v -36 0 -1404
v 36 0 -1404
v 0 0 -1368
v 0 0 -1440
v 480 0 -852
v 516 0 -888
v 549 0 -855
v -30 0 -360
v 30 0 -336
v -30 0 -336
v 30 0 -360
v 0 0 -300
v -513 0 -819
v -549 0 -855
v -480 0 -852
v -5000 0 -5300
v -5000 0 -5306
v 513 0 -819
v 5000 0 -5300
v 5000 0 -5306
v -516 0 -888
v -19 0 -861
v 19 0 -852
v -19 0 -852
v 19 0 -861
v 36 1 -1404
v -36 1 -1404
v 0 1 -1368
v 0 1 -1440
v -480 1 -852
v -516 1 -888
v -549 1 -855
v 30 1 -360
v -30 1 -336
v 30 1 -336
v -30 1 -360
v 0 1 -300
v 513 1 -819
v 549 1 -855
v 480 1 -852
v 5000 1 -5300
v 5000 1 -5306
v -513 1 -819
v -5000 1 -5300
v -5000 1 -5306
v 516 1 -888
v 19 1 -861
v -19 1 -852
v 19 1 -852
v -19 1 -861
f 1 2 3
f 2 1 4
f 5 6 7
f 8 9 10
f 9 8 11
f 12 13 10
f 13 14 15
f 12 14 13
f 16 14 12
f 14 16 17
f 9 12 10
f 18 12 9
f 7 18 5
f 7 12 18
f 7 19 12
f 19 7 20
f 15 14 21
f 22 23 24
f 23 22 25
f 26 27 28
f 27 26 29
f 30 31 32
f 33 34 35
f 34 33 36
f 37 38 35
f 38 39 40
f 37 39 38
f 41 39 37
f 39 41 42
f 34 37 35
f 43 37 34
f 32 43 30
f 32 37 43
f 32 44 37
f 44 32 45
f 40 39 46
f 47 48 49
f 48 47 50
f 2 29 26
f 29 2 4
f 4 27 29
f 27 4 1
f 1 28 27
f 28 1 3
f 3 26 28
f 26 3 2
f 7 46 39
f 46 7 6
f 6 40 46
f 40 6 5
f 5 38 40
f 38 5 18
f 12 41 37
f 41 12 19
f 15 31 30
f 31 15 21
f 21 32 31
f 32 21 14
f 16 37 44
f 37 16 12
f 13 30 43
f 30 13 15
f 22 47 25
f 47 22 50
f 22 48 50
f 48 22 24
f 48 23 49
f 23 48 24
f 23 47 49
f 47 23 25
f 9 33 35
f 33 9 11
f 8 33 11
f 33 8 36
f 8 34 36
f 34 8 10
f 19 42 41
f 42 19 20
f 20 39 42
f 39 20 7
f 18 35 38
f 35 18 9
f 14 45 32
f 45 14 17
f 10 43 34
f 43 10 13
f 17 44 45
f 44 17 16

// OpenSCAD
$fs = 120;

$vpt = [0,1080,480];
$vpr = [-34,0,0];
$vpf = 45;

foul_line = 6;
plain_color = [1,1,1,0.8];
out_color = [1,0.75,0.75,0.8];
eat_color = [0.5,0.75,1,0.8];

// home, first, second, third, rubber
color([1,1,1]) scale([1,-1,-1]) rotate([90,0,0]) linear_extrude(1) {
    polygon([[-30,30*2+300],[30,30*2+300],[30,30+300],[0,300],[-30,30+300]]);
    polygon([[552-36*2,852],[552-36,852+36],[552,852],[552-36,852-36]]);
    polygon([[0,1404+36],[36,1404],[0,1404-36],[-36,1404]]);
    polygon([[-552+36*2,852],[-552+36,852+36],[-552,852],[-552+36,852-36]]);
    polygon([[-19,852],[19,852],[19,9+852],[-19,9+852]]);
}

// foul lines
color([1,1,1,0.5]) scale([1,-1,-1]) rotate([90,0,0]) linear_extrude(1) {
    polygon([[0,300],[-5000,300+5000],[-5000,300+5000+foul_line],[0,300+foul_line]]);
    polygon([[0,300],[5000,300+5000],[5000,300+5000+foul_line],[0,300+foul_line]]);
}

scale([0.1,0.1,-0.1]) translate([-23200,0,0]) {
    color(out_color) polyhedron([[9960,0,15590],[10480,0,18740],[9960,1100,15590],[10480,1100,18740]], [[0,1,3,2]]);
    color(out_color) polyhedron([[9960,0,15590],[9960,0,15690],[9960,1100,15590],[9960,1100,15690]], [[0,1,3,2]]);
    color(out_color) polyhedron([[10480,0,18740],[10480,0,18840],[10480,1100,18740],[10480,1100,18840]], [[0,1,3,2]]);
    color(out_color) polyhedron([[9960,0,15690],[10480,0,18840],[9960,1100,15690],[10480,1100,18840]], [[0,1,3,2]]);
    color(out_color) polyhedron([[9960,1100,15590],[9960,1100,15690],[10480,1100,18740],[10480,1100,18840]], [[0,1,3,2]]);
    color(out_color) polyhedron([[10480,0,18740],[12740,0,23280],[10480,1100,18740],[12740,1100,23280]], [[0,1,3,2]]);
    color(out_color) polyhedron([[10480,0,18740],[10480,0,18840],[10480,1100,18740],[10480,1100,18840]], [[0,1,3,2]]);
    color(out_color) polyhedron([[12740,0,23280],[12740,0,23380],[12740,1100,23280],[12740,1100,23380]], [[0,1,3,2]]);
    color(out_color) polyhedron([[10480,0,18840],[12740,0,23380],[10480,1100,18840],[12740,1100,23380]], [[0,1,3,2]]);
    color(out_color) polyhedron([[10480,1100,18740],[10480,1100,18840],[12740,1100,23280],[12740,1100,23380]], [[0,1,3,2]]);
    color(out_color) polyhedron([[12740,0,23280],[16280,0,26750],[12740,1100,23280],[16280,1100,26750]], [[0,1,3,2]]);
    color(out_color) polyhedron([[12740,0,23280],[12740,0,23380],[12740,1100,23280],[12740,1100,23380]], [[0,1,3,2]]);
    color(out_color) polyhedron([[16280,0,26750],[16280,0,26850],[16280,1100,26750],[16280,1100,26850]], [[0,1,3,2]]);
    color(out_color) polyhedron([[12740,0,23380],[16280,0,26850],[12740,1100,23380],[16280,1100,26850]], [[0,1,3,2]]);
    color(out_color) polyhedron([[12740,1100,23280],[12740,1100,23380],[16280,1100,26750],[16280,1100,26850]], [[0,1,3,2]]);
    color(out_color) polyhedron([[16280,0,26750],[20610,0,28690],[16280,1100,26750],[20610,1100,28690]], [[0,1,3,2]]);
    color(out_color) polyhedron([[16280,0,26750],[16280,0,26850],[16280,1100,26750],[16280,1100,26850]], [[0,1,3,2]]);
    color(out_color) polyhedron([[20610,0,28690],[20610,0,28790],[20610,1100,28690],[20610,1100,28790]], [[0,1,3,2]]);
    color(out_color) polyhedron([[16280,0,26850],[20610,0,28790],[16280,1100,26850],[20610,1100,28790]], [[0,1,3,2]]);
    color(out_color) polyhedron([[16280,1100,26750],[16280,1100,26850],[20610,1100,28690],[20610,1100,28790]], [[0,1,3,2]]);
    color(plain_color) polyhedron([[20610,0,28690],[25790,0,28690],[20610,1100,28690],[25790,1100,28690]], [[0,1,3,2]]);
    color(plain_color) polyhedron([[20610,0,28690],[20610,0,28790],[20610,1100,28690],[20610,1150,28790]], [[0,1,3,2]]);
    color(plain_color) polyhedron([[25790,0,28690],[25780,0,28790],[25790,1100,28690],[25780,1150,28790]], [[0,1,3,2]]);
    color(plain_color) polyhedron([[20610,0,28790],[25780,0,28790],[20610,1150,28790],[25780,1150,28790]], [[0,1,3,2]]);
    color(plain_color) polyhedron([[20610,1100,28690],[20610,1150,28790],[25790,1100,28690],[25780,1150,28790]], [[0,1,3,2]]);
    color(out_color) polyhedron([[25790,0,28690],[30120,0,26750],[25790,1100,28690],[30120,1100,26750]], [[0,1,3,2]]);
    color(out_color) polyhedron([[25790,0,28690],[25790,0,28790],[25790,1100,28690],[25790,1100,28790]], [[0,1,3,2]]);
    color(out_color) polyhedron([[30120,0,26750],[30120,0,26850],[30120,1100,26750],[30120,1100,26850]], [[0,1,3,2]]);
    color(out_color) polyhedron([[25790,0,28790],[30120,0,26850],[25790,1100,28790],[30120,1100,26850]], [[0,1,3,2]]);
    color(out_color) polyhedron([[25790,1100,28690],[25790,1100,28790],[30120,1100,26750],[30120,1100,26850]], [[0,1,3,2]]);
    color(out_color) polyhedron([[30120,0,26760],[33660,0,23280],[30120,1100,26760],[33660,1100,23280]], [[0,1,3,2]]);
    color(out_color) polyhedron([[30120,0,26760],[30120,0,26860],[30120,1100,26760],[30120,1100,26860]], [[0,1,3,2]]);
    color(out_color) polyhedron([[33660,0,23280],[33660,0,23380],[33660,1100,23280],[33660,1100,23380]], [[0,1,3,2]]);
    color(out_color) polyhedron([[30120,0,26860],[33660,0,23380],[30120,1100,26860],[33660,1100,23380]], [[0,1,3,2]]);
    color(out_color) polyhedron([[30120,1100,26760],[30120,1100,26860],[33660,1100,23280],[33660,1100,23380]], [[0,1,3,2]]);
    color(out_color) polyhedron([[33660,0,23280],[35920,0,18740],[33660,1100,23280],[35920,1100,18740]], [[0,1,3,2]]);
    color(out_color) polyhedron([[33660,0,23280],[33660,0,23380],[33660,1100,23280],[33660,1100,23380]], [[0,1,3,2]]);
    color(out_color) polyhedron([[35920,0,18740],[35920,0,18840],[35920,1100,18740],[35920,1100,18840]], [[0,1,3,2]]);
    color(out_color) polyhedron([[33660,0,23380],[35920,0,18840],[33660,1100,23380],[35920,1100,18840]], [[0,1,3,2]]);
    color(out_color) polyhedron([[33660,1100,23280],[33660,1100,23380],[35920,1100,18740],[35920,1100,18840]], [[0,1,3,2]]);
    color(out_color) polyhedron([[35920,0,18740],[36440,0,15590],[35920,1100,18740],[36440,1100,15590]], [[0,1,3,2]]);
    color(out_color) polyhedron([[35920,0,18740],[35920,0,18840],[35920,1100,18740],[35920,1100,18840]], [[0,1,3,2]]);
    color(out_color) polyhedron([[36440,0,15590],[36440,0,15690],[36440,1100,15590],[36440,1100,15690]], [[0,1,3,2]]);
    color(out_color) polyhedron([[35920,0,18840],[36440,0,15690],[35920,1100,18840],[36440,1100,15690]], [[0,1,3,2]]);
    color(out_color) polyhedron([[35920,1100,18740],[35920,1100,18840],[36440,1100,15590],[36440,1100,15690]], [[0,1,3,2]]);
    color(out_color) polyhedron([[27760,0,2720],[32540,0,7350],[27760,1400,2720],[32540,1400,7350]], [[0,1,3,2]]);
    color(out_color) polyhedron([[27760,0,2720],[26710,0,3860],[27760,1400,2720],[26710,1100,3860]], [[0,1,3,2]]);
    color(out_color) polyhedron([[32540,0,7350],[31370,0,8570],[32540,1400,7350],[31370,1100,8570]], [[0,1,3,2]]);
    color(out_color) polyhedron([[26710,0,3860],[31370,0,8570],[26710,1100,3860],[31370,1100,8570]], [[0,1,3,2]]);
    color(out_color) polyhedron([[27760,1400,2720],[26710,1100,3860],[32540,1400,7350],[31370,1100,8570]], [[0,1,3,2]]);
    color(out_color) polyhedron([[13860,0,7350],[18640,0,2720],[13860,1400,7350],[18640,1400,2720]], [[0,1,3,2]]);
    color(out_color) polyhedron([[13860,0,7350],[15030,0,8570],[13860,1400,7350],[15030,1100,8570]], [[0,1,3,2]]);
    color(out_color) polyhedron([[18640,0,2720],[19690,0,3860],[18640,1400,2720],[19690,1100,3860]], [[0,1,3,2]]);
    color(out_color) polyhedron([[15030,0,8570],[19690,0,3860],[15030,1100,8570],[19690,1100,3860]], [[0,1,3,2]]);
    color(out_color) polyhedron([[13860,1400,7350],[15030,1100,8570],[18640,1400,2720],[19690,1100,3860]], [[0,1,3,2]]);
    color(out_color) polyhedron([[20610,0,28700],[25790,0,28700],[20610,4400,28700],[25790,4400,28700]], [[0,1,3,2]]);
    color(out_color) polyhedron([[20610,0,28700],[20610,0,28790],[20610,4400,28700],[20610,4400,28790]], [[0,1,3,2]]);
    color(out_color) polyhedron([[25790,0,28700],[25780,0,28790],[25790,4400,28700],[25780,4400,28790]], [[0,1,3,2]]);
    color(out_color) polyhedron([[20610,0,28790],[25780,0,28790],[20610,4400,28790],[25780,4400,28790]], [[0,1,3,2]]);
    color(out_color) polyhedron([[20610,4400,28700],[20610,4400,28790],[25790,4400,28700],[25780,4400,28790]], [[0,1,3,2]]);
    color(out_color) polyhedron([[1236,0,9090],[19600,0,1940],[1236,5,9090],[19600,5,1940]], [[0,1,3,2]]);
    color(out_color) polyhedron([[1236,0,9090],[1236,0,9100],[1236,5,9090],[1236,5,9100]], [[0,1,3,2]]);
    color(out_color) polyhedron([[19600,0,1940],[19600,0,1950],[19600,5,1940],[19600,5,1950]], [[0,1,3,2]]);
    color(out_color) polyhedron([[1236,0,9100],[19600,0,1950],[1236,5,9100],[19600,5,1950]], [[0,1,3,2]]);
    color(out_color) polyhedron([[1236,5,9090],[1236,5,9100],[19600,5,1940],[19600,5,1950]], [[0,1,3,2]]);
    color(out_color) polyhedron([[26800,0,1940],[34040,0,9090],[26800,5,1940],[34040,5,9090]], [[0,1,3,2]]);
    color(out_color) polyhedron([[26800,0,1940],[26800,0,1950],[26800,5,1940],[26800,5,1950]], [[0,1,3,2]]);
    color(out_color) polyhedron([[34040,0,9090],[34040,0,9100],[34040,5,9090],[34040,5,9100]], [[0,1,3,2]]);
    color(out_color) polyhedron([[26800,0,1950],[34040,0,9100],[26800,5,1950],[34040,5,9100]], [[0,1,3,2]]);
    color(out_color) polyhedron([[26800,5,1940],[26800,5,1950],[34040,5,9090],[34040,5,9100]], [[0,1,3,2]]);
    color(out_color) polyhedron([[16280,0,26850],[16290,0,26850],[16280,1100,26850],[16290,1100,26850]], [[0,1,3,2]]);
    color(out_color) polyhedron([[16280,0,26850],[8790,0,42630],[16280,1100,26850],[8790,9000,42630]], [[0,1,3,2]]);
    color(out_color) polyhedron([[16290,0,26850],[8800,0,42630],[16290,1100,26850],[8800,9000,42630]], [[0,1,3,2]]);
    color(out_color) polyhedron([[8790,0,42630],[8800,0,42630],[8790,9000,42630],[8800,9000,42630]], [[0,1,3,2]]);
    color(out_color) polyhedron([[16280,1100,26850],[8790,9000,42630],[16290,1100,26850],[8800,9000,42630]], [[0,1,3,2]]);
    color(out_color) polyhedron([[12740,0,23380],[12750,0,23380],[12740,1100,23380],[12750,1100,23380]], [[0,1,3,2]]);
    color(out_color) polyhedron([[12740,0,23380],[960,0,40120],[12740,1100,23380],[960,8000,40120]], [[0,1,3,2]]);
    color(out_color) polyhedron([[12750,0,23380],[970,0,40120],[12750,1100,23380],[970,8000,40120]], [[0,1,3,2]]);
    color(out_color) polyhedron([[960,0,40120],[970,0,40120],[960,8000,40120],[970,8000,40120]], [[0,1,3,2]]);
    color(out_color) polyhedron([[12740,1100,23380],[960,8000,40120],[12750,1100,23380],[970,8000,40120]], [[0,1,3,2]]);
    color(plain_color) polyhedron([[0,0,0],[0,0,0],[0,0,0],[0,0,0]], [[0,1,3,2]]);
    color(plain_color) polyhedron([[0,0,0],[0,0,0],[0,0,0],[0,0,0]], [[0,1,3,2]]);
    color(plain_color) polyhedron([[0,0,0],[0,0,0],[0,0,0],[0,0,0]], [[0,1,3,2]]);
    color(plain_color) polyhedron([[0,0,0],[0,0,0],[0,0,0],[0,0,0]], [[0,1,3,2]]);
    color(plain_color) polyhedron([[0,0,0],[0,0,0],[0,0,0],[0,0,0]], [[0,1,3,2]]);
    color(plain_color) polyhedron([[0,0,0],[0,0,0],[0,0,0],[0,0,0]], [[0,1,3,2]]);
    color(plain_color) polyhedron([[0,0,0],[0,0,0],[0,0,0],[0,0,0]], [[0,1,3,2]]);
    color(plain_color) polyhedron([[0,0,0],[0,0,0],[0,0,0],[0,0,0]], [[0,1,3,2]]);
    color(plain_color) polyhedron([[0,0,0],[0,0,0],[0,0,0],[0,0,0]], [[0,1,3,2]]);
    color(plain_color) polyhedron([[0,0,0],[0,0,0],[0,0,0],[0,0,0]], [[0,1,3,2]]);
    color(plain_color) polyhedron([[0,0,0],[0,0,0],[0,0,0],[0,0,0]], [[0,1,3,2]]);
    color(plain_color) polyhedron([[0,0,0],[0,0,0],[0,0,0],[0,0,0]], [[0,1,3,2]]);
    color(plain_color) polyhedron([[0,0,0],[0,0,0],[0,0,0],[0,0,0]], [[0,1,3,2]]);
    color(plain_color) polyhedron([[0,0,0],[0,0,0],[0,0,0],[0,0,0]], [[0,1,3,2]]);
    color(plain_color) polyhedron([[0,0,0],[0,0,0],[0,0,0],[0,0,0]], [[0,1,3,2]]);
    color(plain_color) polyhedron([[0,0,0],[0,0,0],[0,0,0],[0,0,0]], [[0,1,3,2]]);
    color(plain_color) polyhedron([[0,0,0],[0,0,0],[0,0,0],[0,0,0]], [[0,1,3,2]]);
    color(plain_color) polyhedron([[0,0,0],[0,0,0],[0,0,0],[0,0,0]], [[0,1,3,2]]);
    color(plain_color) polyhedron([[0,0,0],[0,0,0],[0,0,0],[0,0,0]], [[0,1,3,2]]);
    color(plain_color) polyhedron([[0,0,0],[0,0,0],[0,0,0],[0,0,0]], [[0,1,3,2]]);
    color(plain_color) polyhedron([[0,0,0],[0,0,0],[0,0,0],[0,0,0]], [[0,1,3,2]]);
    color(plain_color) polyhedron([[0,0,0],[0,0,0],[0,0,0],[0,0,0]], [[0,1,3,2]]);
    color(plain_color) polyhedron([[0,0,0],[0,0,0],[0,0,0],[0,0,0]], [[0,1,3,2]]);
    color(plain_color) polyhedron([[0,0,0],[0,0,0],[0,0,0],[0,0,0]], [[0,1,3,2]]);
    color(plain_color) polyhedron([[0,0,0],[0,0,0],[0,0,0],[0,0,0]], [[0,1,3,2]]);
    color(plain_color) polyhedron([[0,0,0],[0,0,0],[0,0,0],[0,0,0]], [[0,1,3,2]]);
    color(plain_color) polyhedron([[0,0,0],[0,0,0],[0,0,0],[0,0,0]], [[0,1,3,2]]);
    color(plain_color) polyhedron([[0,0,0],[0,0,0],[0,0,0],[0,0,0]], [[0,1,3,2]]);
    color(plain_color) polyhedron([[0,0,0],[0,0,0],[0,0,0],[0,0,0]], [[0,1,3,2]]);
    color(plain_color) polyhedron([[0,0,0],[0,0,0],[0,0,0],[0,0,0]], [[0,1,3,2]]);
    color(plain_color) polyhedron([[0,0,0],[0,0,0],[0,0,0],[0,0,0]], [[0,1,3,2]]);
    color(plain_color) polyhedron([[0,0,0],[0,0,0],[0,0,0],[0,0,0]], [[0,1,3,2]]);
    color(plain_color) polyhedron([[0,0,0],[0,0,0],[0,0,0],[0,0,0]], [[0,1,3,2]]);
    color(plain_color) polyhedron([[0,0,0],[0,0,0],[0,0,0],[0,0,0]], [[0,1,3,2]]);
    color(plain_color) polyhedron([[0,0,0],[0,0,0],[0,0,0],[0,0,0]], [[0,1,3,2]]);
    color(plain_color) polyhedron([[0,0,0],[0,0,0],[0,0,0],[0,0,0]], [[0,1,3,2]]);
    color(plain_color) polyhedron([[0,0,0],[0,0,0],[0,0,0],[0,0,0]], [[0,1,3,2]]);
    color(plain_color) polyhedron([[0,0,0],[0,0,0],[0,0,0],[0,0,0]], [[0,1,3,2]]);
    color(plain_color) polyhedron([[0,0,0],[0,0,0],[0,0,0],[0,0,0]], [[0,1,3,2]]);
    color(plain_color) polyhedron([[0,0,0],[0,0,0],[0,0,0],[0,0,0]], [[0,1,3,2]]);
    color(plain_color) polyhedron([[0,0,0],[0,0,0],[0,0,0],[0,0,0]], [[0,1,3,2]]);
    color(plain_color) polyhedron([[0,0,0],[0,0,0],[0,0,0],[0,0,0]], [[0,1,3,2]]);
    color(plain_color) polyhedron([[0,0,0],[0,0,0],[0,0,0],[0,0,0]], [[0,1,3,2]]);
    color(plain_color) polyhedron([[0,0,0],[0,0,0],[0,0,0],[0,0,0]], [[0,1,3,2]]);
    color(plain_color) polyhedron([[0,0,0],[0,0,0],[0,0,0],[0,0,0]], [[0,1,3,2]]);
    color(plain_color) polyhedron([[0,0,0],[0,0,0],[0,0,0],[0,0,0]], [[0,1,3,2]]);
    color(plain_color) polyhedron([[0,0,0],[0,0,0],[0,0,0],[0,0,0]], [[0,1,3,2]]);
    color(plain_color) polyhedron([[0,0,0],[0,0,0],[0,0,0],[0,0,0]], [[0,1,3,2]]);
    color(plain_color) polyhedron([[0,0,0],[0,0,0],[0,0,0],[0,0,0]], [[0,1,3,2]]);
    color(plain_color) polyhedron([[0,0,0],[0,0,0],[0,0,0],[0,0,0]], [[0,1,3,2]]);
    color(plain_color) polyhedron([[0,0,0],[0,0,0],[0,0,0],[0,0,0]], [[0,1,3,2]]);
    color(plain_color) polyhedron([[0,0,0],[0,0,0],[0,0,0],[0,0,0]], [[0,1,3,2]]);
    color(plain_color) polyhedron([[0,0,0],[0,0,0],[0,0,0],[0,0,0]], [[0,1,3,2]]);
    color(plain_color) polyhedron([[0,0,0],[0,0,0],[0,0,0],[0,0,0]], [[0,1,3,2]]);
    color(plain_color) polyhedron([[0,0,0],[0,0,0],[0,0,0],[0,0,0]], [[0,1,3,2]]);
    color(plain_color) polyhedron([[0,0,0],[0,0,0],[0,0,0],[0,0,0]], [[0,1,3,2]]);
    color(plain_color) polyhedron([[0,0,0],[0,0,0],[0,0,0],[0,0,0]], [[0,1,3,2]]);
    color(plain_color) polyhedron([[0,0,0],[0,0,0],[0,0,0],[0,0,0]], [[0,1,3,2]]);
    color(plain_color) polyhedron([[0,0,0],[0,0,0],[0,0,0],[0,0,0]], [[0,1,3,2]]);
    color(plain_color) polyhedron([[0,0,0],[0,0,0],[0,0,0],[0,0,0]], [[0,1,3,2]]);
    color(plain_color) polyhedron([[0,0,0],[0,0,0],[0,0,0],[0,0,0]], [[0,1,3,2]]);
    color(plain_color) polyhedron([[0,0,0],[0,0,0],[0,0,0],[0,0,0]], [[0,1,3,2]]);
    color(plain_color) polyhedron([[0,0,0],[0,0,0],[0,0,0],[0,0,0]], [[0,1,3,2]]);
    color(plain_color) polyhedron([[0,0,0],[0,0,0],[0,0,0],[0,0,0]], [[0,1,3,2]]);
    color(plain_color) polyhedron([[0,0,0],[0,0,0],[0,0,0],[0,0,0]], [[0,1,3,2]]);
    color(plain_color) polyhedron([[0,0,0],[0,0,0],[0,0,0],[0,0,0]], [[0,1,3,2]]);
    color(plain_color) polyhedron([[0,0,0],[0,0,0],[0,0,0],[0,0,0]], [[0,1,3,2]]);
    color(plain_color) polyhedron([[0,0,0],[0,0,0],[0,0,0],[0,0,0]], [[0,1,3,2]]);
    color(plain_color) polyhedron([[0,0,0],[0,0,0],[0,0,0],[0,0,0]], [[0,1,3,2]]);
    color(plain_color) polyhedron([[0,0,0],[0,0,0],[0,0,0],[0,0,0]], [[0,1,3,2]]);
    color(plain_color) polyhedron([[0,0,0],[0,0,0],[0,0,0],[0,0,0]], [[0,1,3,2]]);
    color(plain_color) polyhedron([[0,0,0],[0,0,0],[0,0,0],[0,0,0]], [[0,1,3,2]]);
    color(plain_color) polyhedron([[0,0,0],[0,0,0],[0,0,0],[0,0,0]], [[0,1,3,2]]);
    color(plain_color) polyhedron([[0,0,0],[0,0,0],[0,0,0],[0,0,0]], [[0,1,3,2]]);
    color(plain_color) polyhedron([[0,0,0],[0,0,0],[0,0,0],[0,0,0]], [[0,1,3,2]]);
    color(plain_color) polyhedron([[0,0,0],[0,0,0],[0,0,0],[0,0,0]], [[0,1,3,2]]);
    color(plain_color) polyhedron([[0,0,0],[0,0,0],[0,0,0],[0,0,0]], [[0,1,3,2]]);
    color(plain_color) polyhedron([[0,0,0],[0,0,0],[0,0,0],[0,0,0]], [[0,1,3,2]]);
    color(plain_color) polyhedron([[0,0,0],[0,0,0],[0,0,0],[0,0,0]], [[0,1,3,2]]);
    color(plain_color) polyhedron([[0,0,0],[0,0,0],[0,0,0],[0,0,0]], [[0,1,3,2]]);
    color(plain_color) polyhedron([[0,0,0],[0,0,0],[0,0,0],[0,0,0]], [[0,1,3,2]]);
    color(plain_color) polyhedron([[0,0,0],[0,0,0],[0,0,0],[0,0,0]], [[0,1,3,2]]);
    color(plain_color) polyhedron([[0,0,0],[0,0,0],[0,0,0],[0,0,0]], [[0,1,3,2]]);
    color(plain_color) polyhedron([[0,0,0],[0,0,0],[0,0,0],[0,0,0]], [[0,1,3,2]]);
    color(plain_color) polyhedron([[0,0,0],[0,0,0],[0,0,0],[0,0,0]], [[0,1,3,2]]);
    color(plain_color) polyhedron([[0,0,0],[0,0,0],[0,0,0],[0,0,0]], [[0,1,3,2]]);
    color(plain_color) polyhedron([[0,0,0],[0,0,0],[0,0,0],[0,0,0]], [[0,1,3,2]]);
    color(plain_color) polyhedron([[0,0,0],[0,0,0],[0,0,0],[0,0,0]], [[0,1,3,2]]);
    color(plain_color) polyhedron([[0,0,0],[0,0,0],[0,0,0],[0,0,0]], [[0,1,3,2]]);
    color(plain_color) polyhedron([[0,0,0],[0,0,0],[0,0,0],[0,0,0]], [[0,1,3,2]]);
    color(plain_color) polyhedron([[0,0,0],[0,0,0],[0,0,0],[0,0,0]], [[0,1,3,2]]);
    color(plain_color) polyhedron([[0,0,0],[0,0,0],[0,0,0],[0,0,0]], [[0,1,3,2]]);
    color(plain_color) polyhedron([[0,0,0],[0,0,0],[0,0,0],[0,0,0]], [[0,1,3,2]]);
    color(plain_color) polyhedron([[0,0,0],[0,0,0],[0,0,0],[0,0,0]], [[0,1,3,2]]);
    color(plain_color) polyhedron([[0,0,0],[0,0,0],[0,0,0],[0,0,0]], [[0,1,3,2]]);
    color(plain_color) polyhedron([[0,0,0],[0,0,0],[0,0,0],[0,0,0]], [[0,1,3,2]]);
    color(plain_color) polyhedron([[0,0,0],[0,0,0],[0,0,0],[0,0,0]], [[0,1,3,2]]);
    color(plain_color) polyhedron([[0,0,0],[0,0,0],[0,0,0],[0,0,0]], [[0,1,3,2]]);
    color(plain_color) polyhedron([[0,0,0],[0,0,0],[0,0,0],[0,0,0]], [[0,1,3,2]]);
    color(plain_color) polyhedron([[0,0,0],[0,0,0],[0,0,0],[0,0,0]], [[0,1,3,2]]);
    color(plain_color) polyhedron([[0,0,0],[0,0,0],[0,0,0],[0,0,0]], [[0,1,3,2]]);
    color(plain_color) polyhedron([[0,0,0],[0,0,0],[0,0,0],[0,0,0]], [[0,1,3,2]]);
    color(plain_color) polyhedron([[0,0,0],[0,0,0],[0,0,0],[0,0,0]], [[0,1,3,2]]);
    color(plain_color) polyhedron([[0,0,0],[0,0,0],[0,0,0],[0,0,0]], [[0,1,3,2]]);
    color(plain_color) polyhedron([[0,0,0],[0,0,0],[0,0,0],[0,0,0]], [[0,1,3,2]]);
    color(plain_color) polyhedron([[0,0,0],[0,0,0],[0,0,0],[0,0,0]], [[0,1,3,2]]);
    color(plain_color) polyhedron([[0,0,0],[0,0,0],[0,0,0],[0,0,0]], [[0,1,3,2]]);
    color(plain_color) polyhedron([[0,0,0],[0,0,0],[0,0,0],[0,0,0]], [[0,1,3,2]]);
    color(plain_color) polyhedron([[0,0,0],[0,0,0],[0,0,0],[0,0,0]], [[0,1,3,2]]);
    color(plain_color) polyhedron([[0,0,0],[0,0,0],[0,0,0],[0,0,0]], [[0,1,3,2]]);
    color(plain_color) polyhedron([[0,0,0],[0,0,0],[0,0,0],[0,0,0]], [[0,1,3,2]]);
    color(plain_color) polyhedron([[0,0,0],[0,0,0],[0,0,0],[0,0,0]], [[0,1,3,2]]);
    color(plain_color) polyhedron([[0,0,0],[0,0,0],[0,0,0],[0,0,0]], [[0,1,3,2]]);
    color(plain_color) polyhedron([[0,0,0],[0,0,0],[0,0,0],[0,0,0]], [[0,1,3,2]]);
    color(plain_color) polyhedron([[0,0,0],[0,0,0],[0,0,0],[0,0,0]], [[0,1,3,2]]);
    color(plain_color) polyhedron([[0,0,0],[0,0,0],[0,0,0],[0,0,0]], [[0,1,3,2]]);
    color(plain_color) polyhedron([[0,0,0],[0,0,0],[0,0,0],[0,0,0]], [[0,1,3,2]]);
    color(plain_color) polyhedron([[0,0,0],[0,0,0],[0,0,0],[0,0,0]], [[0,1,3,2]]);
    color(plain_color) polyhedron([[0,0,0],[0,0,0],[0,0,0],[0,0,0]], [[0,1,3,2]]);
    color(plain_color) polyhedron([[0,0,0],[0,0,0],[0,0,0],[0,0,0]], [[0,1,3,2]]);
    color(plain_color) polyhedron([[0,0,0],[0,0,0],[0,0,0],[0,0,0]], [[0,1,3,2]]);
    color(plain_color) polyhedron([[0,0,0],[0,0,0],[0,0,0],[0,0,0]], [[0,1,3,2]]);
    color(plain_color) polyhedron([[0,0,0],[0,0,0],[0,0,0],[0,0,0]], [[0,1,3,2]]);
    color(plain_color) polyhedron([[0,0,0],[0,0,0],[0,0,0],[0,0,0]], [[0,1,3,2]]);
    color(plain_color) polyhedron([[0,0,0],[0,0,0],[0,0,0],[0,0,0]], [[0,1,3,2]]);
    color(plain_color) polyhedron([[0,0,0],[0,0,0],[0,0,0],[0,0,0]], [[0,1,3,2]]);
    color(plain_color) polyhedron([[0,0,0],[0,0,0],[0,0,0],[0,0,0]], [[0,1,3,2]]);
    color(plain_color) polyhedron([[0,0,0],[0,0,0],[0,0,0],[0,0,0]], [[0,1,3,2]]);
    color(plain_color) polyhedron([[0,0,0],[0,0,0],[0,0,0],[0,0,0]], [[0,1,3,2]]);
    color(plain_color) polyhedron([[0,0,0],[0,0,0],[0,0,0],[0,0,0]], [[0,1,3,2]]);
    color(plain_color) polyhedron([[0,0,0],[0,0,0],[0,0,0],[0,0,0]], [[0,1,3,2]]);
    color(plain_color) polyhedron([[0,0,0],[0,0,0],[0,0,0],[0,0,0]], [[0,1,3,2]]);
    color(plain_color) polyhedron([[0,0,0],[0,0,0],[0,0,0],[0,0,0]], [[0,1,3,2]]);
    color(plain_color) polyhedron([[0,0,0],[0,0,0],[0,0,0],[0,0,0]], [[0,1,3,2]]);
    color(plain_color) polyhedron([[0,0,0],[0,0,0],[0,0,0],[0,0,0]], [[0,1,3,2]]);
    color(plain_color) polyhedron([[0,0,0],[0,0,0],[0,0,0],[0,0,0]], [[0,1,3,2]]);
    color(plain_color) polyhedron([[0,0,0],[0,0,0],[0,0,0],[0,0,0]], [[0,1,3,2]]);
    color(plain_color) polyhedron([[0,0,0],[0,0,0],[0,0,0],[0,0,0]], [[0,1,3,2]]);
    color(plain_color) polyhedron([[0,0,0],[0,0,0],[0,0,0],[0,0,0]], [[0,1,3,2]]);
    color(plain_color) polyhedron([[0,0,0],[0,0,0],[0,0,0],[0,0,0]], [[0,1,3,2]]);
    color(plain_color) polyhedron([[0,0,0],[0,0,0],[0,0,0],[0,0,0]], [[0,1,3,2]]);
    color(plain_color) polyhedron([[0,0,0],[0,0,0],[0,0,0],[0,0,0]], [[0,1,3,2]]);
    color(plain_color) polyhedron([[0,0,0],[0,0,0],[0,0,0],[0,0,0]], [[0,1,3,2]]);
    color(plain_color) polyhedron([[0,0,0],[0,0,0],[0,0,0],[0,0,0]], [[0,1,3,2]]);
    color(plain_color) polyhedron([[0,0,0],[0,0,0],[0,0,0],[0,0,0]], [[0,1,3,2]]);
    color(plain_color) polyhedron([[0,0,0],[0,0,0],[0,0,0],[0,0,0]], [[0,1,3,2]]);
    color(plain_color) polyhedron([[0,0,0],[0,0,0],[0,0,0],[0,0,0]], [[0,1,3,2]]);
    color(plain_color) polyhedron([[0,0,0],[0,0,0],[0,0,0],[0,0,0]], [[0,1,3,2]]);
    color(plain_color) polyhedron([[0,0,0],[0,0,0],[0,0,0],[0,0,0]], [[0,1,3,2]]);
    color(plain_color) polyhedron([[0,0,0],[0,0,0],[0,0,0],[0,0,0]], [[0,1,3,2]]);
    color(plain_color) polyhedron([[0,0,0],[0,0,0],[0,0,0],[0,0,0]], [[0,1,3,2]]);
    color(plain_color) polyhedron([[0,0,0],[0,0,0],[0,0,0],[0,0,0]], [[0,1,3,2]]);
    color(plain_color) polyhedron([[0,0,0],[0,0,0],[0,0,0],[0,0,0]], [[0,1,3,2]]);
    color(plain_color) polyhedron([[0,0,0],[0,0,0],[0,0,0],[0,0,0]], [[0,1,3,2]]);
    color(plain_color) polyhedron([[0,0,0],[0,0,0],[0,0,0],[0,0,0]], [[0,1,3,2]]);
    color(plain_color) polyhedron([[0,0,0],[0,0,0],[0,0,0],[0,0,0]], [[0,1,3,2]]);
    color(plain_color) polyhedron([[0,0,0],[0,0,0],[0,0,0],[0,0,0]], [[0,1,3,2]]);
    color(plain_color) polyhedron([[0,0,0],[0,0,0],[0,0,0],[0,0,0]], [[0,1,3,2]]);
    color(plain_color) polyhedron([[0,0,0],[0,0,0],[0,0,0],[0,0,0]], [[0,1,3,2]]);
    color(plain_color) polyhedron([[0,0,0],[0,0,0],[0,0,0],[0,0,0]], [[0,1,3,2]]);
    color(plain_color) polyhedron([[0,0,0],[0,0,0],[0,0,0],[0,0,0]], [[0,1,3,2]]);
    color(plain_color) polyhedron([[0,0,0],[0,0,0],[0,0,0],[0,0,0]], [[0,1,3,2]]);
    color(plain_color) polyhedron([[0,0,0],[0,0,0],[0,0,0],[0,0,0]], [[0,1,3,2]]);
    color(plain_color) polyhedron([[0,0,0],[0,0,0],[0,0,0],[0,0,0]], [[0,1,3,2]]);
    color(plain_color) polyhedron([[0,0,0],[0,0,0],[0,0,0],[0,0,0]], [[0,1,3,2]]);
    color(plain_color) polyhedron([[0,0,0],[0,0,0],[0,0,0],[0,0,0]], [[0,1,3,2]]);
    color(plain_color) polyhedron([[0,0,0],[0,0,0],[0,0,0],[0,0,0]], [[0,1,3,2]]);
    color(plain_color) polyhedron([[0,0,0],[0,0,0],[0,0,0],[0,0,0]], [[0,1,3,2]]);
    color(plain_color) polyhedron([[0,0,0],[0,0,0],[0,0,0],[0,0,0]], [[0,1,3,2]]);
    color(plain_color) polyhedron([[0,0,0],[0,0,0],[0,0,0],[0,0,0]], [[0,1,3,2]]);
    color(plain_color) polyhedron([[0,0,0],[0,0,0],[0,0,0],[0,0,0]], [[0,1,3,2]]);
    color(plain_color) polyhedron([[0,0,0],[0,0,0],[0,0,0],[0,0,0]], [[0,1,3,2]]);
    color(plain_color) polyhedron([[0,0,0],[0,0,0],[0,0,0],[0,0,0]], [[0,1,3,2]]);
    color(plain_color) polyhedron([[0,0,0],[0,0,0],[0,0,0],[0,0,0]], [[0,1,3,2]]);
    color(plain_color) polyhedron([[0,0,0],[0,0,0],[0,0,0],[0,0,0]], [[0,1,3,2]]);
    color(plain_color) polyhedron([[0,0,0],[0,0,0],[0,0,0],[0,0,0]], [[0,1,3,2]]);
    color(plain_color) polyhedron([[0,0,0],[0,0,0],[0,0,0],[0,0,0]], [[0,1,3,2]]);
    color(plain_color) polyhedron([[0,0,0],[0,0,0],[0,0,0],[0,0,0]], [[0,1,3,2]]);
    color(plain_color) polyhedron([[0,0,0],[0,0,0],[0,0,0],[0,0,0]], [[0,1,3,2]]);
    color(plain_color) polyhedron([[0,0,0],[0,0,0],[0,0,0],[0,0,0]], [[0,1,3,2]]);
    color(plain_color) polyhedron([[0,0,0],[0,0,0],[0,0,0],[0,0,0]], [[0,1,3,2]]);
    color(plain_color) polyhedron([[0,0,0],[0,0,0],[0,0,0],[0,0,0]], [[0,1,3,2]]);
    color(plain_color) polyhedron([[0,0,0],[0,0,0],[0,0,0],[0,0,0]], [[0,1,3,2]]);
    color(plain_color) polyhedron([[0,0,0],[0,0,0],[0,0,0],[0,0,0]], [[0,1,3,2]]);
    color(plain_color) polyhedron([[0,0,0],[0,0,0],[0,0,0],[0,0,0]], [[0,1,3,2]]);
    color(plain_color) polyhedron([[0,0,0],[0,0,0],[0,0,0],[0,0,0]], [[0,1,3,2]]);
    color(plain_color) polyhedron([[0,0,0],[0,0,0],[0,0,0],[0,0,0]], [[0,1,3,2]]);
    color(plain_color) polyhedron([[0,0,0],[0,0,0],[0,0,0],[0,0,0]], [[0,1,3,2]]);
    color(plain_color) polyhedron([[0,0,0],[0,0,0],[0,0,0],[0,0,0]], [[0,1,3,2]]);
    color(plain_color) polyhedron([[0,0,0],[0,0,0],[0,0,0],[0,0,0]], [[0,1,3,2]]);
    color(plain_color) polyhedron([[0,0,0],[0,0,0],[0,0,0],[0,0,0]], [[0,1,3,2]]);
    color(plain_color) polyhedron([[0,0,0],[0,0,0],[0,0,0],[0,0,0]], [[0,1,3,2]]);
    color(plain_color) polyhedron([[0,0,0],[0,0,0],[0,0,0],[0,0,0]], [[0,1,3,2]]);
    color(plain_color) polyhedron([[0,0,0],[0,0,0],[0,0,0],[0,0,0]], [[0,1,3,2]]);
    color(plain_color) polyhedron([[0,0,0],[0,0,0],[0,0,0],[0,0,0]], [[0,1,3,2]]);
    color(plain_color) polyhedron([[0,0,0],[0,0,0],[0,0,0],[0,0,0]], [[0,1,3,2]]);
    color(plain_color) polyhedron([[0,0,0],[0,0,0],[0,0,0],[0,0,0]], [[0,1,3,2]]);
    color(plain_color) polyhedron([[0,0,0],[0,0,0],[0,0,0],[0,0,0]], [[0,1,3,2]]);
    color(plain_color) polyhedron([[0,0,0],[0,0,0],[0,0,0],[0,0,0]], [[0,1,3,2]]);
    color(plain_color) polyhedron([[0,0,0],[0,0,0],[0,0,0],[0,0,0]], [[0,1,3,2]]);
    color(plain_color) polyhedron([[0,0,0],[0,0,0],[0,0,0],[0,0,0]], [[0,1,3,2]]);
    color(plain_color) polyhedron([[0,0,0],[0,0,0],[0,0,0],[0,0,0]], [[0,1,3,2]]);
    color(plain_color) polyhedron([[0,0,0],[0,0,0],[0,0,0],[0,0,0]], [[0,1,3,2]]);
    color(plain_color) polyhedron([[0,0,0],[0,0,0],[0,0,0],[0,0,0]], [[0,1,3,2]]);
    color(plain_color) polyhedron([[0,0,0],[0,0,0],[0,0,0],[0,0,0]], [[0,1,3,2]]);
    color(plain_color) polyhedron([[0,0,0],[0,0,0],[0,0,0],[0,0,0]], [[0,1,3,2]]);
    color(plain_color) polyhedron([[0,0,0],[0,0,0],[0,0,0],[0,0,0]], [[0,1,3,2]]);
    color(plain_color) polyhedron([[0,0,0],[0,0,0],[0,0,0],[0,0,0]], [[0,1,3,2]]);
    color(plain_color) polyhedron([[0,0,0],[0,0,0],[0,0,0],[0,0,0]], [[0,1,3,2]]);
    color(plain_color) polyhedron([[0,0,0],[0,0,0],[0,0,0],[0,0,0]], [[0,1,3,2]]);
    color(plain_color) polyhedron([[0,0,0],[0,0,0],[0,0,0],[0,0,0]], [[0,1,3,2]]);
    color(plain_color) polyhedron([[0,0,0],[0,0,0],[0,0,0],[0,0,0]], [[0,1,3,2]]);
    color(plain_color) polyhedron([[0,0,0],[0,0,0],[0,0,0],[0,0,0]], [[0,1,3,2]]);
    color(plain_color) polyhedron([[0,0,0],[0,0,0],[0,0,0],[0,0,0]], [[0,1,3,2]]);
    color(plain_color) polyhedron([[0,0,0],[0,0,0],[0,0,0],[0,0,0]], [[0,1,3,2]]);
    color(plain_color) polyhedron([[0,0,0],[0,0,0],[0,0,0],[0,0,0]], [[0,1,3,2]]);
    color(plain_color) polyhedron([[0,0,0],[0,0,0],[0,0,0],[0,0,0]], [[0,1,3,2]]);
    color(plain_color) polyhedron([[0,0,0],[0,0,0],[0,0,0],[0,0,0]], [[0,1,3,2]]);
    color(plain_color) polyhedron([[0,0,0],[0,0,0],[0,0,0],[0,0,0]], [[0,1,3,2]]);
    color(plain_color) polyhedron([[0,0,0],[0,0,0],[0,0,0],[0,0,0]], [[0,1,3,2]]);
    color(plain_color) polyhedron([[0,0,0],[0,0,0],[0,0,0],[0,0,0]], [[0,1,3,2]]);
    color(plain_color) polyhedron([[0,0,0],[0,0,0],[0,0,0],[0,0,0]], [[0,1,3,2]]);
    color(plain_color) polyhedron([[0,0,0],[0,0,0],[0,0,0],[0,0,0]], [[0,1,3,2]]);
    color(plain_color) polyhedron([[0,0,0],[0,0,0],[0,0,0],[0,0,0]], [[0,1,3,2]]);
    color(plain_color) polyhedron([[0,0,0],[0,0,0],[0,0,0],[0,0,0]], [[0,1,3,2]]);
    color(plain_color) polyhedron([[0,0,0],[0,0,0],[0,0,0],[0,0,0]], [[0,1,3,2]]);
    color(plain_color) polyhedron([[0,0,0],[0,0,0],[0,0,0],[0,0,0]], [[0,1,3,2]]);
    color(plain_color) polyhedron([[0,0,0],[0,0,0],[0,0,0],[0,0,0]], [[0,1,3,2]]);
    color(plain_color) polyhedron([[0,0,0],[0,0,0],[0,0,0],[0,0,0]], [[0,1,3,2]]);
    color(plain_color) polyhedron([[0,0,0],[0,0,0],[0,0,0],[0,0,0]], [[0,1,3,2]]);
    color(plain_color) polyhedron([[0,0,0],[0,0,0],[0,0,0],[0,0,0]], [[0,1,3,2]]);
    color(plain_color) polyhedron([[0,0,0],[0,0,0],[0,0,0],[0,0,0]], [[0,1,3,2]]);
    color(plain_color) polyhedron([[0,0,0],[0,0,0],[0,0,0],[0,0,0]], [[0,1,3,2]]);
    color(plain_color) polyhedron([[0,0,0],[0,0,0],[0,0,0],[0,0,0]], [[0,1,3,2]]);
    color(plain_color) polyhedron([[0,0,0],[0,0,0],[0,0,0],[0,0,0]], [[0,1,3,2]]);
    color(plain_color) polyhedron([[0,0,0],[0,0,0],[0,0,0],[0,0,0]], [[0,1,3,2]]);
    color(plain_color) polyhedron([[0,0,0],[0,0,0],[0,0,0],[0,0,0]], [[0,1,3,2]]);
    color(plain_color) polyhedron([[0,0,0],[0,0,0],[0,0,0],[0,0,0]], [[0,1,3,2]]);
    color(plain_color) polyhedron([[0,0,0],[0,0,0],[0,0,0],[0,0,0]], [[0,1,3,2]]);
    color(plain_color) polyhedron([[0,0,0],[0,0,0],[0,0,0],[0,0,0]], [[0,1,3,2]]);
}
